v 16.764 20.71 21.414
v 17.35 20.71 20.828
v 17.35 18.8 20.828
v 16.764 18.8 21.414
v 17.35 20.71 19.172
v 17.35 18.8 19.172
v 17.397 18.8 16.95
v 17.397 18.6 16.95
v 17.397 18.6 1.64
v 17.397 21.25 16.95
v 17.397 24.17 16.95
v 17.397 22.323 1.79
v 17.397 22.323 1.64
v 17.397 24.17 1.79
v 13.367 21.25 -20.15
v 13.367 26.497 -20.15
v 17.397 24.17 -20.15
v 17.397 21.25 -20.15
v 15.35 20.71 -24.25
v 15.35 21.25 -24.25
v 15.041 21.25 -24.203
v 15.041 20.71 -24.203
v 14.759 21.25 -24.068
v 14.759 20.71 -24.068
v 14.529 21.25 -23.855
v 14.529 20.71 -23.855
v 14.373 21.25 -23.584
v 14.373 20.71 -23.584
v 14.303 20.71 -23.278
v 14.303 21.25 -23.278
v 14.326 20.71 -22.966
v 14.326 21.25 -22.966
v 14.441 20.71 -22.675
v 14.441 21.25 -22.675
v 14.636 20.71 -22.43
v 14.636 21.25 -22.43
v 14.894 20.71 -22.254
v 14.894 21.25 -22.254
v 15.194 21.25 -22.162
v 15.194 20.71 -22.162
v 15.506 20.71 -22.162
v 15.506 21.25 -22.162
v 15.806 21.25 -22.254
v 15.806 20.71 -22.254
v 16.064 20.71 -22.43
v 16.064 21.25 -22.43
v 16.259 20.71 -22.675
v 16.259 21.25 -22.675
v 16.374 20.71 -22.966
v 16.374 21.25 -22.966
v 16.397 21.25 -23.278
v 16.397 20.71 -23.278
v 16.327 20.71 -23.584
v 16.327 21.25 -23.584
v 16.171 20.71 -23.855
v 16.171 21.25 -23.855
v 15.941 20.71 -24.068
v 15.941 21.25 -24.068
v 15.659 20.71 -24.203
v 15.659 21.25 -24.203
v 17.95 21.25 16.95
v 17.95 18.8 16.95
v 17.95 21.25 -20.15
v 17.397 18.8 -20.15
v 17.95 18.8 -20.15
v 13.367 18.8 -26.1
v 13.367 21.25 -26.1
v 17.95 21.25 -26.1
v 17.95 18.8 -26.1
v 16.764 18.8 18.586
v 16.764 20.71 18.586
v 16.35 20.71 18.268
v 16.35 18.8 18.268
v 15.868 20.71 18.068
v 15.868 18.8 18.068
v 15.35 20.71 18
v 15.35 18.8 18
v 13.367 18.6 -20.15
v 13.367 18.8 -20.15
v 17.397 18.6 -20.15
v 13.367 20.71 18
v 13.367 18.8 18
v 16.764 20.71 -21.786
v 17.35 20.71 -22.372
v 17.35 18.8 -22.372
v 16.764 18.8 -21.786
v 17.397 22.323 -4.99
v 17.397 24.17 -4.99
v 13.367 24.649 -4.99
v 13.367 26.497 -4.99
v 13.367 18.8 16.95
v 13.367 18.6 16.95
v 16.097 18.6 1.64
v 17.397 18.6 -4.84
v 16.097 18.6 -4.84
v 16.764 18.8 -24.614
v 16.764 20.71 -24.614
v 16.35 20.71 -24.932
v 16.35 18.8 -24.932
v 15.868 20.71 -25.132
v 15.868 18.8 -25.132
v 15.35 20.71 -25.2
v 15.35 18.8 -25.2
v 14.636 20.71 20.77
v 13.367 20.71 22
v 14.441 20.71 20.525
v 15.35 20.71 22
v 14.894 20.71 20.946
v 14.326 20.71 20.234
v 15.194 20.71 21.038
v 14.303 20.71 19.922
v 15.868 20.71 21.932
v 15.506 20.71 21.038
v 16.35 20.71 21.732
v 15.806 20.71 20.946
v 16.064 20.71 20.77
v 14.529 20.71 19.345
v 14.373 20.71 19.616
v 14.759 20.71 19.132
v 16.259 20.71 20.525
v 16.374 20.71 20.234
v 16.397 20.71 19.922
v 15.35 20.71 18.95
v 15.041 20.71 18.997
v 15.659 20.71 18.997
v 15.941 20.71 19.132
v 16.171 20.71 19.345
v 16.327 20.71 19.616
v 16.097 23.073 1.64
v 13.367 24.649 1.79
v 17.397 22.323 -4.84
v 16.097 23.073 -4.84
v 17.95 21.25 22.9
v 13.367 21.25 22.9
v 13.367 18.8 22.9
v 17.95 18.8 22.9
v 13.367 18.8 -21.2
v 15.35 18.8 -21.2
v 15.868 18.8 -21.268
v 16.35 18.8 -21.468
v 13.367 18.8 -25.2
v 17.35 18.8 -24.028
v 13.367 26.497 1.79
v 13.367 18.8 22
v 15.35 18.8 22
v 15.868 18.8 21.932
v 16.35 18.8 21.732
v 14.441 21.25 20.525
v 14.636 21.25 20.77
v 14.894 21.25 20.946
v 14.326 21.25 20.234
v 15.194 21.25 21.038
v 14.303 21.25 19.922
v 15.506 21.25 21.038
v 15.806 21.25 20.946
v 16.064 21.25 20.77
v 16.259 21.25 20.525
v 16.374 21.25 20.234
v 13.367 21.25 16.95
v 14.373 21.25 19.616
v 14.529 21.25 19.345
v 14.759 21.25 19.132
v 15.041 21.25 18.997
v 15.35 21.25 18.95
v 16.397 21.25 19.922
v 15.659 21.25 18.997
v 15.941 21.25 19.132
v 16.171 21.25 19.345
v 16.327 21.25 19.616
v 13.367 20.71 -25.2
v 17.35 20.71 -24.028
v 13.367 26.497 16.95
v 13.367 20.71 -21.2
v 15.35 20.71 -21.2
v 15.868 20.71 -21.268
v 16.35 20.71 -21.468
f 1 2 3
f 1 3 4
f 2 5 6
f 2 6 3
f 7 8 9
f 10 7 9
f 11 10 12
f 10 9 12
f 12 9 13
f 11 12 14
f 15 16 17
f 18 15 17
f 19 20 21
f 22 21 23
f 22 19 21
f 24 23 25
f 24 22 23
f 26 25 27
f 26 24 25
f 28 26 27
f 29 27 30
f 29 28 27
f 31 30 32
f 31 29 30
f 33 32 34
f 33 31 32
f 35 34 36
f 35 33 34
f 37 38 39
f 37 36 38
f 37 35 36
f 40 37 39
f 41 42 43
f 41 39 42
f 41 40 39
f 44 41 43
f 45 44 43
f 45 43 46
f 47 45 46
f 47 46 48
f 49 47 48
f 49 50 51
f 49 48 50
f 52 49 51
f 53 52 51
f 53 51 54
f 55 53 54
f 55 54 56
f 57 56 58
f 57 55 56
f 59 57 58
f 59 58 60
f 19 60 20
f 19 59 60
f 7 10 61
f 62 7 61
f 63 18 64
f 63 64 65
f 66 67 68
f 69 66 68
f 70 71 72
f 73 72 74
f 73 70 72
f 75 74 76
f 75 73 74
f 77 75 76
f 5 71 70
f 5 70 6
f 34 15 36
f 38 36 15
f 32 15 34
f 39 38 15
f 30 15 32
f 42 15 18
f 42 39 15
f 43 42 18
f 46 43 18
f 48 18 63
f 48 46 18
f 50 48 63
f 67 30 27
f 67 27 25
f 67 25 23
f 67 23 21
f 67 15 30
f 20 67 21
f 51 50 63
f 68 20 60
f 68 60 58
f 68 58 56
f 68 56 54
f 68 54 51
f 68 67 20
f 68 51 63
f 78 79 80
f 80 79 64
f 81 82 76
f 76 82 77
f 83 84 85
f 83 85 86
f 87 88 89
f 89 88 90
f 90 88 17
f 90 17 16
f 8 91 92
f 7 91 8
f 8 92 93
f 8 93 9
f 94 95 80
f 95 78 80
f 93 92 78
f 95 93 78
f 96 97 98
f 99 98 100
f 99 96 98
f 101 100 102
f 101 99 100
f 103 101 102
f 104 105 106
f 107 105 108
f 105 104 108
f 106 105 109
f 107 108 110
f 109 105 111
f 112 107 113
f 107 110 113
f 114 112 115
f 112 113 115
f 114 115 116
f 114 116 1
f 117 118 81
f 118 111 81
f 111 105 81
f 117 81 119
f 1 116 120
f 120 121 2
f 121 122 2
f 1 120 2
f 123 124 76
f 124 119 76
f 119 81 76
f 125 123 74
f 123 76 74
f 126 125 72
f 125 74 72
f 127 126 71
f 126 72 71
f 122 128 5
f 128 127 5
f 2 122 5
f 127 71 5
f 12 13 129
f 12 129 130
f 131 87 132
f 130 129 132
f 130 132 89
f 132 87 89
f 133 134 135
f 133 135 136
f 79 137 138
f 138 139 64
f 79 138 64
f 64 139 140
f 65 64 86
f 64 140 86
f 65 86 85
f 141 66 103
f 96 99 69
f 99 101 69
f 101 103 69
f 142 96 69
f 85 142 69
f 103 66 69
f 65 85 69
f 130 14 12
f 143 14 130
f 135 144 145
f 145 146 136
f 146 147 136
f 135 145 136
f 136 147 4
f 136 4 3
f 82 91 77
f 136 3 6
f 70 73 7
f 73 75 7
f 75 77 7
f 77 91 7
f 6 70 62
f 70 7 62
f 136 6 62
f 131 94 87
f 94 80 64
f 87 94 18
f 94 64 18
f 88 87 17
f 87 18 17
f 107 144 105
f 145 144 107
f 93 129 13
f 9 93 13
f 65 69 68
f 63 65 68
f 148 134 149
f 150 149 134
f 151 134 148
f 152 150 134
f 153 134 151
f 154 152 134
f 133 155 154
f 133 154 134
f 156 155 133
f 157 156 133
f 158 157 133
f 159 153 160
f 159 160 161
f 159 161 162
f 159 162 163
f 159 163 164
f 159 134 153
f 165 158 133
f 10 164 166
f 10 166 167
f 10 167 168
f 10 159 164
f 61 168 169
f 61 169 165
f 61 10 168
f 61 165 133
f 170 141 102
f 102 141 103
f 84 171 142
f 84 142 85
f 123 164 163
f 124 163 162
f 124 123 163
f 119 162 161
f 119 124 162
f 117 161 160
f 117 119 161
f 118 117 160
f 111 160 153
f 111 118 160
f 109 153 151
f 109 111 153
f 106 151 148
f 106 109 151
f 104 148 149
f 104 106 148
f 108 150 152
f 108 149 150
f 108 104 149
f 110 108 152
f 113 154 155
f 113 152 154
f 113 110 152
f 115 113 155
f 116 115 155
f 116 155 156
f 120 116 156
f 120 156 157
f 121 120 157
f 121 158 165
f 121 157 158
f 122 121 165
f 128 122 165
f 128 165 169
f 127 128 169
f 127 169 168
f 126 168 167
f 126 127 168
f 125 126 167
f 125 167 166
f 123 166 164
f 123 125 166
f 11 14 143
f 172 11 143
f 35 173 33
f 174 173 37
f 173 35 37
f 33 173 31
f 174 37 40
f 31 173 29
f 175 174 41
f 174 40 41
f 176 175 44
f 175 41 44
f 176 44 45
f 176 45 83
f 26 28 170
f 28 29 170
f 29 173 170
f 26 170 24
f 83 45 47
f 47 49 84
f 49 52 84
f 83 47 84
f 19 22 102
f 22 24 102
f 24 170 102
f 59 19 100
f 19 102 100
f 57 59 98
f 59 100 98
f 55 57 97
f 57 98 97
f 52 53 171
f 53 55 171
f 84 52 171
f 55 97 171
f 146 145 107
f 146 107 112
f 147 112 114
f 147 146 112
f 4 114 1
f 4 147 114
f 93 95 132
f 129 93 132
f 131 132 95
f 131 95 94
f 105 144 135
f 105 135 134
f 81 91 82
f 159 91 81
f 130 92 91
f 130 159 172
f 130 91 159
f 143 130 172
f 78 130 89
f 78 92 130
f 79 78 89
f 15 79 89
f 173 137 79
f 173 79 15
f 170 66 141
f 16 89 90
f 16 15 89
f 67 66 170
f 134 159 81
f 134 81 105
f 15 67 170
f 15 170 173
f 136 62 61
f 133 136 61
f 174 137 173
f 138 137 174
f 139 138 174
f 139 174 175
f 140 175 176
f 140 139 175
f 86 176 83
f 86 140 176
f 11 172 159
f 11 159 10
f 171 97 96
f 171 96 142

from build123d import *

# Parameters (mm, degrees)
CLAMP_START                      = -20.15
CLAMP_X_COVER_DEPTH              = 37.1
WIRE_START                       = -4.99
WIRE_CHANNEL_X_COVER_Z_5_0_DEPTH = 6.78
WIRE_START_2                     = -4.84
SKETCH3_W                        = 1.6
SKETCH3_H                        = 5.420657937
WIRE_NOTCH_X_COVER_Z_5_0_DEPTH   = 6.48
EAR_START                        = -26.1
SKETCH4_W                        = 4.582851153
SKETCH4_H                        = 2.45
EAR_X_COVER_26_DEPTH             = 5.95
EAR_START_2                      = 16.95
SKETCH5_W                        = 4.582851153
SKETCH5_H                        = 2.45
EAR_X_COVER_17_DEPTH             = 5.95
CUT_EXTRUDE3_START               = 18.7
SKETCH6_R                        = 1.05
CUT_EXTRUDE3_DEPTH               = 2.65
CUT_EXTRUDE4_START               = 18.79
SKETCH7_R                        = 2
CUT_EXTRUDE4_DEPTH               = 1.92
CUT_EXTRUDE5_START               = 18.79
SKETCH8_W                        = 2.082851153
SKETCH8_H                        = 4
CUT_EXTRUDE5_DEPTH               = 1.92
CUT_EXTRUDE6_START               = 18.79
CUT_EXTRUDE6_DEPTH               = 1.92
CUT_EXTRUDE7_START               = 18.79
CUT_EXTRUDE7_DEPTH               = 1.92


with BuildPart() as part:
    # Sketch1 → Clamp +X cover (new body)
    with BuildSketch(Plane.XY.offset(CLAMP_START)):
        Polygon((13.367148847, 18.6), (17.397275866, 18.6), (17.397275866, 24.170102587), (13.367148847, 26.496897507), align=None)
    extrude(amount=CLAMP_X_COVER_DEPTH)

    # Sketch2 → Wire channel +X cover Z -5.0 (cut)
    with BuildSketch(Plane.XY.offset(WIRE_START)):
        Polygon((11.102085338, 27.920102587), (19.762339376, 22.920102587), (18.912339376, 21.447859401), (10.252085338, 26.447859401), align=None)
    extrude(amount=WIRE_CHANNEL_X_COVER_Z_5_0_DEPTH, mode=Mode.SUBTRACT)

    # Sketch3 → Wire notch +X cover Z -5.0 (cut)
    with BuildSketch(Plane.XY.offset(WIRE_START_2)):
        with Locations((16.897275866, 21.210328969)):
            Rectangle(SKETCH3_W, SKETCH3_H)
    extrude(amount=WIRE_NOTCH_X_COVER_Z_5_0_DEPTH, mode=Mode.SUBTRACT)

    # Sketch4 → Ear +X cover -26 (add)
    with BuildSketch(Plane.XY.offset(EAR_START)):
        with Locations((15.658574424, 20.025)):
            Rectangle(SKETCH4_W, SKETCH4_H)
    extrude(amount=EAR_X_COVER_26_DEPTH)

    # Sketch5 → Ear +X cover 17 (add)
    with BuildSketch(Plane.XY.offset(EAR_START_2)):
        with Locations((15.658574424, 20.025)):
            Rectangle(SKETCH5_W, SKETCH5_H)
    extrude(amount=EAR_X_COVER_17_DEPTH)

    # Sketch6 → Cut-Extrude3 (cut)
    with BuildSketch(Plane(origin=(0, 0, 0), x_dir=(1, 0, 0), z_dir=(0, 1, 0)).offset(CUT_EXTRUDE3_START)):
        with Locations(Location((15.35, 23.2, 0), (0, 0, 90))):
            Circle(SKETCH6_R)
        with Locations(Location((15.35, -20, 0), (0, 0, 90))):
            Circle(SKETCH6_R)
    extrude(amount=CUT_EXTRUDE3_DEPTH, mode=Mode.SUBTRACT)

    # Sketch7 → Cut-Extrude4 (cut)
    with BuildSketch(Plane(origin=(0, 0, 0), x_dir=(1, 0, 0), z_dir=(0, 1, 0)).offset(CUT_EXTRUDE4_START)):
        with Locations((15.35, 23.2)):
            Circle(SKETCH7_R)
        with Locations((15.35, -20)):
            Circle(SKETCH7_R)
    extrude(amount=CUT_EXTRUDE4_DEPTH, mode=Mode.SUBTRACT)

    # Sketch8 → Cut-Extrude5 (cut)
    with BuildSketch(Plane(origin=(0, 0, 0), x_dir=(1, 0, 0), z_dir=(0, 1, 0)).offset(CUT_EXTRUDE5_START)):
        with Locations((14.308574424, 23.2)):
            Rectangle(SKETCH8_W, SKETCH8_H)
        with Locations((14.308574424, -20)):
            Rectangle(SKETCH8_W, SKETCH8_H)
    extrude(amount=CUT_EXTRUDE5_DEPTH, mode=Mode.SUBTRACT)

    # Sketch9 → Cut-Extrude6 (cut)
    with BuildSketch(Plane(origin=(0, 0, 0), x_dir=(1, 0, 0), z_dir=(0, 1, 0)).offset(CUT_EXTRUDE6_START)):
        Polygon((15.35, 25.2), (16.764213562, 24.614213562), (17.35, 24.028427125), (17.35, 22.371572875), (16.764213562, 21.785786438), (15.35, 21.2), align=None)
    extrude(amount=CUT_EXTRUDE6_DEPTH, mode=Mode.SUBTRACT)

    # Sketch10 → Cut-Extrude7 (cut)
    with BuildSketch(Plane(origin=(0, 0, 0), x_dir=(1, 0, 0), z_dir=(0, 1, 0)).offset(CUT_EXTRUDE7_START)):
        Polygon((15.35, -18), (16.764213562, -18.585786438), (17.35, -19.171572875), (17.35, -20.828427125), (16.764213562, -21.414213562), (15.35, -22), align=None)
    extrude(amount=CUT_EXTRUDE7_DEPTH, mode=Mode.SUBTRACT)


solid = part.part
